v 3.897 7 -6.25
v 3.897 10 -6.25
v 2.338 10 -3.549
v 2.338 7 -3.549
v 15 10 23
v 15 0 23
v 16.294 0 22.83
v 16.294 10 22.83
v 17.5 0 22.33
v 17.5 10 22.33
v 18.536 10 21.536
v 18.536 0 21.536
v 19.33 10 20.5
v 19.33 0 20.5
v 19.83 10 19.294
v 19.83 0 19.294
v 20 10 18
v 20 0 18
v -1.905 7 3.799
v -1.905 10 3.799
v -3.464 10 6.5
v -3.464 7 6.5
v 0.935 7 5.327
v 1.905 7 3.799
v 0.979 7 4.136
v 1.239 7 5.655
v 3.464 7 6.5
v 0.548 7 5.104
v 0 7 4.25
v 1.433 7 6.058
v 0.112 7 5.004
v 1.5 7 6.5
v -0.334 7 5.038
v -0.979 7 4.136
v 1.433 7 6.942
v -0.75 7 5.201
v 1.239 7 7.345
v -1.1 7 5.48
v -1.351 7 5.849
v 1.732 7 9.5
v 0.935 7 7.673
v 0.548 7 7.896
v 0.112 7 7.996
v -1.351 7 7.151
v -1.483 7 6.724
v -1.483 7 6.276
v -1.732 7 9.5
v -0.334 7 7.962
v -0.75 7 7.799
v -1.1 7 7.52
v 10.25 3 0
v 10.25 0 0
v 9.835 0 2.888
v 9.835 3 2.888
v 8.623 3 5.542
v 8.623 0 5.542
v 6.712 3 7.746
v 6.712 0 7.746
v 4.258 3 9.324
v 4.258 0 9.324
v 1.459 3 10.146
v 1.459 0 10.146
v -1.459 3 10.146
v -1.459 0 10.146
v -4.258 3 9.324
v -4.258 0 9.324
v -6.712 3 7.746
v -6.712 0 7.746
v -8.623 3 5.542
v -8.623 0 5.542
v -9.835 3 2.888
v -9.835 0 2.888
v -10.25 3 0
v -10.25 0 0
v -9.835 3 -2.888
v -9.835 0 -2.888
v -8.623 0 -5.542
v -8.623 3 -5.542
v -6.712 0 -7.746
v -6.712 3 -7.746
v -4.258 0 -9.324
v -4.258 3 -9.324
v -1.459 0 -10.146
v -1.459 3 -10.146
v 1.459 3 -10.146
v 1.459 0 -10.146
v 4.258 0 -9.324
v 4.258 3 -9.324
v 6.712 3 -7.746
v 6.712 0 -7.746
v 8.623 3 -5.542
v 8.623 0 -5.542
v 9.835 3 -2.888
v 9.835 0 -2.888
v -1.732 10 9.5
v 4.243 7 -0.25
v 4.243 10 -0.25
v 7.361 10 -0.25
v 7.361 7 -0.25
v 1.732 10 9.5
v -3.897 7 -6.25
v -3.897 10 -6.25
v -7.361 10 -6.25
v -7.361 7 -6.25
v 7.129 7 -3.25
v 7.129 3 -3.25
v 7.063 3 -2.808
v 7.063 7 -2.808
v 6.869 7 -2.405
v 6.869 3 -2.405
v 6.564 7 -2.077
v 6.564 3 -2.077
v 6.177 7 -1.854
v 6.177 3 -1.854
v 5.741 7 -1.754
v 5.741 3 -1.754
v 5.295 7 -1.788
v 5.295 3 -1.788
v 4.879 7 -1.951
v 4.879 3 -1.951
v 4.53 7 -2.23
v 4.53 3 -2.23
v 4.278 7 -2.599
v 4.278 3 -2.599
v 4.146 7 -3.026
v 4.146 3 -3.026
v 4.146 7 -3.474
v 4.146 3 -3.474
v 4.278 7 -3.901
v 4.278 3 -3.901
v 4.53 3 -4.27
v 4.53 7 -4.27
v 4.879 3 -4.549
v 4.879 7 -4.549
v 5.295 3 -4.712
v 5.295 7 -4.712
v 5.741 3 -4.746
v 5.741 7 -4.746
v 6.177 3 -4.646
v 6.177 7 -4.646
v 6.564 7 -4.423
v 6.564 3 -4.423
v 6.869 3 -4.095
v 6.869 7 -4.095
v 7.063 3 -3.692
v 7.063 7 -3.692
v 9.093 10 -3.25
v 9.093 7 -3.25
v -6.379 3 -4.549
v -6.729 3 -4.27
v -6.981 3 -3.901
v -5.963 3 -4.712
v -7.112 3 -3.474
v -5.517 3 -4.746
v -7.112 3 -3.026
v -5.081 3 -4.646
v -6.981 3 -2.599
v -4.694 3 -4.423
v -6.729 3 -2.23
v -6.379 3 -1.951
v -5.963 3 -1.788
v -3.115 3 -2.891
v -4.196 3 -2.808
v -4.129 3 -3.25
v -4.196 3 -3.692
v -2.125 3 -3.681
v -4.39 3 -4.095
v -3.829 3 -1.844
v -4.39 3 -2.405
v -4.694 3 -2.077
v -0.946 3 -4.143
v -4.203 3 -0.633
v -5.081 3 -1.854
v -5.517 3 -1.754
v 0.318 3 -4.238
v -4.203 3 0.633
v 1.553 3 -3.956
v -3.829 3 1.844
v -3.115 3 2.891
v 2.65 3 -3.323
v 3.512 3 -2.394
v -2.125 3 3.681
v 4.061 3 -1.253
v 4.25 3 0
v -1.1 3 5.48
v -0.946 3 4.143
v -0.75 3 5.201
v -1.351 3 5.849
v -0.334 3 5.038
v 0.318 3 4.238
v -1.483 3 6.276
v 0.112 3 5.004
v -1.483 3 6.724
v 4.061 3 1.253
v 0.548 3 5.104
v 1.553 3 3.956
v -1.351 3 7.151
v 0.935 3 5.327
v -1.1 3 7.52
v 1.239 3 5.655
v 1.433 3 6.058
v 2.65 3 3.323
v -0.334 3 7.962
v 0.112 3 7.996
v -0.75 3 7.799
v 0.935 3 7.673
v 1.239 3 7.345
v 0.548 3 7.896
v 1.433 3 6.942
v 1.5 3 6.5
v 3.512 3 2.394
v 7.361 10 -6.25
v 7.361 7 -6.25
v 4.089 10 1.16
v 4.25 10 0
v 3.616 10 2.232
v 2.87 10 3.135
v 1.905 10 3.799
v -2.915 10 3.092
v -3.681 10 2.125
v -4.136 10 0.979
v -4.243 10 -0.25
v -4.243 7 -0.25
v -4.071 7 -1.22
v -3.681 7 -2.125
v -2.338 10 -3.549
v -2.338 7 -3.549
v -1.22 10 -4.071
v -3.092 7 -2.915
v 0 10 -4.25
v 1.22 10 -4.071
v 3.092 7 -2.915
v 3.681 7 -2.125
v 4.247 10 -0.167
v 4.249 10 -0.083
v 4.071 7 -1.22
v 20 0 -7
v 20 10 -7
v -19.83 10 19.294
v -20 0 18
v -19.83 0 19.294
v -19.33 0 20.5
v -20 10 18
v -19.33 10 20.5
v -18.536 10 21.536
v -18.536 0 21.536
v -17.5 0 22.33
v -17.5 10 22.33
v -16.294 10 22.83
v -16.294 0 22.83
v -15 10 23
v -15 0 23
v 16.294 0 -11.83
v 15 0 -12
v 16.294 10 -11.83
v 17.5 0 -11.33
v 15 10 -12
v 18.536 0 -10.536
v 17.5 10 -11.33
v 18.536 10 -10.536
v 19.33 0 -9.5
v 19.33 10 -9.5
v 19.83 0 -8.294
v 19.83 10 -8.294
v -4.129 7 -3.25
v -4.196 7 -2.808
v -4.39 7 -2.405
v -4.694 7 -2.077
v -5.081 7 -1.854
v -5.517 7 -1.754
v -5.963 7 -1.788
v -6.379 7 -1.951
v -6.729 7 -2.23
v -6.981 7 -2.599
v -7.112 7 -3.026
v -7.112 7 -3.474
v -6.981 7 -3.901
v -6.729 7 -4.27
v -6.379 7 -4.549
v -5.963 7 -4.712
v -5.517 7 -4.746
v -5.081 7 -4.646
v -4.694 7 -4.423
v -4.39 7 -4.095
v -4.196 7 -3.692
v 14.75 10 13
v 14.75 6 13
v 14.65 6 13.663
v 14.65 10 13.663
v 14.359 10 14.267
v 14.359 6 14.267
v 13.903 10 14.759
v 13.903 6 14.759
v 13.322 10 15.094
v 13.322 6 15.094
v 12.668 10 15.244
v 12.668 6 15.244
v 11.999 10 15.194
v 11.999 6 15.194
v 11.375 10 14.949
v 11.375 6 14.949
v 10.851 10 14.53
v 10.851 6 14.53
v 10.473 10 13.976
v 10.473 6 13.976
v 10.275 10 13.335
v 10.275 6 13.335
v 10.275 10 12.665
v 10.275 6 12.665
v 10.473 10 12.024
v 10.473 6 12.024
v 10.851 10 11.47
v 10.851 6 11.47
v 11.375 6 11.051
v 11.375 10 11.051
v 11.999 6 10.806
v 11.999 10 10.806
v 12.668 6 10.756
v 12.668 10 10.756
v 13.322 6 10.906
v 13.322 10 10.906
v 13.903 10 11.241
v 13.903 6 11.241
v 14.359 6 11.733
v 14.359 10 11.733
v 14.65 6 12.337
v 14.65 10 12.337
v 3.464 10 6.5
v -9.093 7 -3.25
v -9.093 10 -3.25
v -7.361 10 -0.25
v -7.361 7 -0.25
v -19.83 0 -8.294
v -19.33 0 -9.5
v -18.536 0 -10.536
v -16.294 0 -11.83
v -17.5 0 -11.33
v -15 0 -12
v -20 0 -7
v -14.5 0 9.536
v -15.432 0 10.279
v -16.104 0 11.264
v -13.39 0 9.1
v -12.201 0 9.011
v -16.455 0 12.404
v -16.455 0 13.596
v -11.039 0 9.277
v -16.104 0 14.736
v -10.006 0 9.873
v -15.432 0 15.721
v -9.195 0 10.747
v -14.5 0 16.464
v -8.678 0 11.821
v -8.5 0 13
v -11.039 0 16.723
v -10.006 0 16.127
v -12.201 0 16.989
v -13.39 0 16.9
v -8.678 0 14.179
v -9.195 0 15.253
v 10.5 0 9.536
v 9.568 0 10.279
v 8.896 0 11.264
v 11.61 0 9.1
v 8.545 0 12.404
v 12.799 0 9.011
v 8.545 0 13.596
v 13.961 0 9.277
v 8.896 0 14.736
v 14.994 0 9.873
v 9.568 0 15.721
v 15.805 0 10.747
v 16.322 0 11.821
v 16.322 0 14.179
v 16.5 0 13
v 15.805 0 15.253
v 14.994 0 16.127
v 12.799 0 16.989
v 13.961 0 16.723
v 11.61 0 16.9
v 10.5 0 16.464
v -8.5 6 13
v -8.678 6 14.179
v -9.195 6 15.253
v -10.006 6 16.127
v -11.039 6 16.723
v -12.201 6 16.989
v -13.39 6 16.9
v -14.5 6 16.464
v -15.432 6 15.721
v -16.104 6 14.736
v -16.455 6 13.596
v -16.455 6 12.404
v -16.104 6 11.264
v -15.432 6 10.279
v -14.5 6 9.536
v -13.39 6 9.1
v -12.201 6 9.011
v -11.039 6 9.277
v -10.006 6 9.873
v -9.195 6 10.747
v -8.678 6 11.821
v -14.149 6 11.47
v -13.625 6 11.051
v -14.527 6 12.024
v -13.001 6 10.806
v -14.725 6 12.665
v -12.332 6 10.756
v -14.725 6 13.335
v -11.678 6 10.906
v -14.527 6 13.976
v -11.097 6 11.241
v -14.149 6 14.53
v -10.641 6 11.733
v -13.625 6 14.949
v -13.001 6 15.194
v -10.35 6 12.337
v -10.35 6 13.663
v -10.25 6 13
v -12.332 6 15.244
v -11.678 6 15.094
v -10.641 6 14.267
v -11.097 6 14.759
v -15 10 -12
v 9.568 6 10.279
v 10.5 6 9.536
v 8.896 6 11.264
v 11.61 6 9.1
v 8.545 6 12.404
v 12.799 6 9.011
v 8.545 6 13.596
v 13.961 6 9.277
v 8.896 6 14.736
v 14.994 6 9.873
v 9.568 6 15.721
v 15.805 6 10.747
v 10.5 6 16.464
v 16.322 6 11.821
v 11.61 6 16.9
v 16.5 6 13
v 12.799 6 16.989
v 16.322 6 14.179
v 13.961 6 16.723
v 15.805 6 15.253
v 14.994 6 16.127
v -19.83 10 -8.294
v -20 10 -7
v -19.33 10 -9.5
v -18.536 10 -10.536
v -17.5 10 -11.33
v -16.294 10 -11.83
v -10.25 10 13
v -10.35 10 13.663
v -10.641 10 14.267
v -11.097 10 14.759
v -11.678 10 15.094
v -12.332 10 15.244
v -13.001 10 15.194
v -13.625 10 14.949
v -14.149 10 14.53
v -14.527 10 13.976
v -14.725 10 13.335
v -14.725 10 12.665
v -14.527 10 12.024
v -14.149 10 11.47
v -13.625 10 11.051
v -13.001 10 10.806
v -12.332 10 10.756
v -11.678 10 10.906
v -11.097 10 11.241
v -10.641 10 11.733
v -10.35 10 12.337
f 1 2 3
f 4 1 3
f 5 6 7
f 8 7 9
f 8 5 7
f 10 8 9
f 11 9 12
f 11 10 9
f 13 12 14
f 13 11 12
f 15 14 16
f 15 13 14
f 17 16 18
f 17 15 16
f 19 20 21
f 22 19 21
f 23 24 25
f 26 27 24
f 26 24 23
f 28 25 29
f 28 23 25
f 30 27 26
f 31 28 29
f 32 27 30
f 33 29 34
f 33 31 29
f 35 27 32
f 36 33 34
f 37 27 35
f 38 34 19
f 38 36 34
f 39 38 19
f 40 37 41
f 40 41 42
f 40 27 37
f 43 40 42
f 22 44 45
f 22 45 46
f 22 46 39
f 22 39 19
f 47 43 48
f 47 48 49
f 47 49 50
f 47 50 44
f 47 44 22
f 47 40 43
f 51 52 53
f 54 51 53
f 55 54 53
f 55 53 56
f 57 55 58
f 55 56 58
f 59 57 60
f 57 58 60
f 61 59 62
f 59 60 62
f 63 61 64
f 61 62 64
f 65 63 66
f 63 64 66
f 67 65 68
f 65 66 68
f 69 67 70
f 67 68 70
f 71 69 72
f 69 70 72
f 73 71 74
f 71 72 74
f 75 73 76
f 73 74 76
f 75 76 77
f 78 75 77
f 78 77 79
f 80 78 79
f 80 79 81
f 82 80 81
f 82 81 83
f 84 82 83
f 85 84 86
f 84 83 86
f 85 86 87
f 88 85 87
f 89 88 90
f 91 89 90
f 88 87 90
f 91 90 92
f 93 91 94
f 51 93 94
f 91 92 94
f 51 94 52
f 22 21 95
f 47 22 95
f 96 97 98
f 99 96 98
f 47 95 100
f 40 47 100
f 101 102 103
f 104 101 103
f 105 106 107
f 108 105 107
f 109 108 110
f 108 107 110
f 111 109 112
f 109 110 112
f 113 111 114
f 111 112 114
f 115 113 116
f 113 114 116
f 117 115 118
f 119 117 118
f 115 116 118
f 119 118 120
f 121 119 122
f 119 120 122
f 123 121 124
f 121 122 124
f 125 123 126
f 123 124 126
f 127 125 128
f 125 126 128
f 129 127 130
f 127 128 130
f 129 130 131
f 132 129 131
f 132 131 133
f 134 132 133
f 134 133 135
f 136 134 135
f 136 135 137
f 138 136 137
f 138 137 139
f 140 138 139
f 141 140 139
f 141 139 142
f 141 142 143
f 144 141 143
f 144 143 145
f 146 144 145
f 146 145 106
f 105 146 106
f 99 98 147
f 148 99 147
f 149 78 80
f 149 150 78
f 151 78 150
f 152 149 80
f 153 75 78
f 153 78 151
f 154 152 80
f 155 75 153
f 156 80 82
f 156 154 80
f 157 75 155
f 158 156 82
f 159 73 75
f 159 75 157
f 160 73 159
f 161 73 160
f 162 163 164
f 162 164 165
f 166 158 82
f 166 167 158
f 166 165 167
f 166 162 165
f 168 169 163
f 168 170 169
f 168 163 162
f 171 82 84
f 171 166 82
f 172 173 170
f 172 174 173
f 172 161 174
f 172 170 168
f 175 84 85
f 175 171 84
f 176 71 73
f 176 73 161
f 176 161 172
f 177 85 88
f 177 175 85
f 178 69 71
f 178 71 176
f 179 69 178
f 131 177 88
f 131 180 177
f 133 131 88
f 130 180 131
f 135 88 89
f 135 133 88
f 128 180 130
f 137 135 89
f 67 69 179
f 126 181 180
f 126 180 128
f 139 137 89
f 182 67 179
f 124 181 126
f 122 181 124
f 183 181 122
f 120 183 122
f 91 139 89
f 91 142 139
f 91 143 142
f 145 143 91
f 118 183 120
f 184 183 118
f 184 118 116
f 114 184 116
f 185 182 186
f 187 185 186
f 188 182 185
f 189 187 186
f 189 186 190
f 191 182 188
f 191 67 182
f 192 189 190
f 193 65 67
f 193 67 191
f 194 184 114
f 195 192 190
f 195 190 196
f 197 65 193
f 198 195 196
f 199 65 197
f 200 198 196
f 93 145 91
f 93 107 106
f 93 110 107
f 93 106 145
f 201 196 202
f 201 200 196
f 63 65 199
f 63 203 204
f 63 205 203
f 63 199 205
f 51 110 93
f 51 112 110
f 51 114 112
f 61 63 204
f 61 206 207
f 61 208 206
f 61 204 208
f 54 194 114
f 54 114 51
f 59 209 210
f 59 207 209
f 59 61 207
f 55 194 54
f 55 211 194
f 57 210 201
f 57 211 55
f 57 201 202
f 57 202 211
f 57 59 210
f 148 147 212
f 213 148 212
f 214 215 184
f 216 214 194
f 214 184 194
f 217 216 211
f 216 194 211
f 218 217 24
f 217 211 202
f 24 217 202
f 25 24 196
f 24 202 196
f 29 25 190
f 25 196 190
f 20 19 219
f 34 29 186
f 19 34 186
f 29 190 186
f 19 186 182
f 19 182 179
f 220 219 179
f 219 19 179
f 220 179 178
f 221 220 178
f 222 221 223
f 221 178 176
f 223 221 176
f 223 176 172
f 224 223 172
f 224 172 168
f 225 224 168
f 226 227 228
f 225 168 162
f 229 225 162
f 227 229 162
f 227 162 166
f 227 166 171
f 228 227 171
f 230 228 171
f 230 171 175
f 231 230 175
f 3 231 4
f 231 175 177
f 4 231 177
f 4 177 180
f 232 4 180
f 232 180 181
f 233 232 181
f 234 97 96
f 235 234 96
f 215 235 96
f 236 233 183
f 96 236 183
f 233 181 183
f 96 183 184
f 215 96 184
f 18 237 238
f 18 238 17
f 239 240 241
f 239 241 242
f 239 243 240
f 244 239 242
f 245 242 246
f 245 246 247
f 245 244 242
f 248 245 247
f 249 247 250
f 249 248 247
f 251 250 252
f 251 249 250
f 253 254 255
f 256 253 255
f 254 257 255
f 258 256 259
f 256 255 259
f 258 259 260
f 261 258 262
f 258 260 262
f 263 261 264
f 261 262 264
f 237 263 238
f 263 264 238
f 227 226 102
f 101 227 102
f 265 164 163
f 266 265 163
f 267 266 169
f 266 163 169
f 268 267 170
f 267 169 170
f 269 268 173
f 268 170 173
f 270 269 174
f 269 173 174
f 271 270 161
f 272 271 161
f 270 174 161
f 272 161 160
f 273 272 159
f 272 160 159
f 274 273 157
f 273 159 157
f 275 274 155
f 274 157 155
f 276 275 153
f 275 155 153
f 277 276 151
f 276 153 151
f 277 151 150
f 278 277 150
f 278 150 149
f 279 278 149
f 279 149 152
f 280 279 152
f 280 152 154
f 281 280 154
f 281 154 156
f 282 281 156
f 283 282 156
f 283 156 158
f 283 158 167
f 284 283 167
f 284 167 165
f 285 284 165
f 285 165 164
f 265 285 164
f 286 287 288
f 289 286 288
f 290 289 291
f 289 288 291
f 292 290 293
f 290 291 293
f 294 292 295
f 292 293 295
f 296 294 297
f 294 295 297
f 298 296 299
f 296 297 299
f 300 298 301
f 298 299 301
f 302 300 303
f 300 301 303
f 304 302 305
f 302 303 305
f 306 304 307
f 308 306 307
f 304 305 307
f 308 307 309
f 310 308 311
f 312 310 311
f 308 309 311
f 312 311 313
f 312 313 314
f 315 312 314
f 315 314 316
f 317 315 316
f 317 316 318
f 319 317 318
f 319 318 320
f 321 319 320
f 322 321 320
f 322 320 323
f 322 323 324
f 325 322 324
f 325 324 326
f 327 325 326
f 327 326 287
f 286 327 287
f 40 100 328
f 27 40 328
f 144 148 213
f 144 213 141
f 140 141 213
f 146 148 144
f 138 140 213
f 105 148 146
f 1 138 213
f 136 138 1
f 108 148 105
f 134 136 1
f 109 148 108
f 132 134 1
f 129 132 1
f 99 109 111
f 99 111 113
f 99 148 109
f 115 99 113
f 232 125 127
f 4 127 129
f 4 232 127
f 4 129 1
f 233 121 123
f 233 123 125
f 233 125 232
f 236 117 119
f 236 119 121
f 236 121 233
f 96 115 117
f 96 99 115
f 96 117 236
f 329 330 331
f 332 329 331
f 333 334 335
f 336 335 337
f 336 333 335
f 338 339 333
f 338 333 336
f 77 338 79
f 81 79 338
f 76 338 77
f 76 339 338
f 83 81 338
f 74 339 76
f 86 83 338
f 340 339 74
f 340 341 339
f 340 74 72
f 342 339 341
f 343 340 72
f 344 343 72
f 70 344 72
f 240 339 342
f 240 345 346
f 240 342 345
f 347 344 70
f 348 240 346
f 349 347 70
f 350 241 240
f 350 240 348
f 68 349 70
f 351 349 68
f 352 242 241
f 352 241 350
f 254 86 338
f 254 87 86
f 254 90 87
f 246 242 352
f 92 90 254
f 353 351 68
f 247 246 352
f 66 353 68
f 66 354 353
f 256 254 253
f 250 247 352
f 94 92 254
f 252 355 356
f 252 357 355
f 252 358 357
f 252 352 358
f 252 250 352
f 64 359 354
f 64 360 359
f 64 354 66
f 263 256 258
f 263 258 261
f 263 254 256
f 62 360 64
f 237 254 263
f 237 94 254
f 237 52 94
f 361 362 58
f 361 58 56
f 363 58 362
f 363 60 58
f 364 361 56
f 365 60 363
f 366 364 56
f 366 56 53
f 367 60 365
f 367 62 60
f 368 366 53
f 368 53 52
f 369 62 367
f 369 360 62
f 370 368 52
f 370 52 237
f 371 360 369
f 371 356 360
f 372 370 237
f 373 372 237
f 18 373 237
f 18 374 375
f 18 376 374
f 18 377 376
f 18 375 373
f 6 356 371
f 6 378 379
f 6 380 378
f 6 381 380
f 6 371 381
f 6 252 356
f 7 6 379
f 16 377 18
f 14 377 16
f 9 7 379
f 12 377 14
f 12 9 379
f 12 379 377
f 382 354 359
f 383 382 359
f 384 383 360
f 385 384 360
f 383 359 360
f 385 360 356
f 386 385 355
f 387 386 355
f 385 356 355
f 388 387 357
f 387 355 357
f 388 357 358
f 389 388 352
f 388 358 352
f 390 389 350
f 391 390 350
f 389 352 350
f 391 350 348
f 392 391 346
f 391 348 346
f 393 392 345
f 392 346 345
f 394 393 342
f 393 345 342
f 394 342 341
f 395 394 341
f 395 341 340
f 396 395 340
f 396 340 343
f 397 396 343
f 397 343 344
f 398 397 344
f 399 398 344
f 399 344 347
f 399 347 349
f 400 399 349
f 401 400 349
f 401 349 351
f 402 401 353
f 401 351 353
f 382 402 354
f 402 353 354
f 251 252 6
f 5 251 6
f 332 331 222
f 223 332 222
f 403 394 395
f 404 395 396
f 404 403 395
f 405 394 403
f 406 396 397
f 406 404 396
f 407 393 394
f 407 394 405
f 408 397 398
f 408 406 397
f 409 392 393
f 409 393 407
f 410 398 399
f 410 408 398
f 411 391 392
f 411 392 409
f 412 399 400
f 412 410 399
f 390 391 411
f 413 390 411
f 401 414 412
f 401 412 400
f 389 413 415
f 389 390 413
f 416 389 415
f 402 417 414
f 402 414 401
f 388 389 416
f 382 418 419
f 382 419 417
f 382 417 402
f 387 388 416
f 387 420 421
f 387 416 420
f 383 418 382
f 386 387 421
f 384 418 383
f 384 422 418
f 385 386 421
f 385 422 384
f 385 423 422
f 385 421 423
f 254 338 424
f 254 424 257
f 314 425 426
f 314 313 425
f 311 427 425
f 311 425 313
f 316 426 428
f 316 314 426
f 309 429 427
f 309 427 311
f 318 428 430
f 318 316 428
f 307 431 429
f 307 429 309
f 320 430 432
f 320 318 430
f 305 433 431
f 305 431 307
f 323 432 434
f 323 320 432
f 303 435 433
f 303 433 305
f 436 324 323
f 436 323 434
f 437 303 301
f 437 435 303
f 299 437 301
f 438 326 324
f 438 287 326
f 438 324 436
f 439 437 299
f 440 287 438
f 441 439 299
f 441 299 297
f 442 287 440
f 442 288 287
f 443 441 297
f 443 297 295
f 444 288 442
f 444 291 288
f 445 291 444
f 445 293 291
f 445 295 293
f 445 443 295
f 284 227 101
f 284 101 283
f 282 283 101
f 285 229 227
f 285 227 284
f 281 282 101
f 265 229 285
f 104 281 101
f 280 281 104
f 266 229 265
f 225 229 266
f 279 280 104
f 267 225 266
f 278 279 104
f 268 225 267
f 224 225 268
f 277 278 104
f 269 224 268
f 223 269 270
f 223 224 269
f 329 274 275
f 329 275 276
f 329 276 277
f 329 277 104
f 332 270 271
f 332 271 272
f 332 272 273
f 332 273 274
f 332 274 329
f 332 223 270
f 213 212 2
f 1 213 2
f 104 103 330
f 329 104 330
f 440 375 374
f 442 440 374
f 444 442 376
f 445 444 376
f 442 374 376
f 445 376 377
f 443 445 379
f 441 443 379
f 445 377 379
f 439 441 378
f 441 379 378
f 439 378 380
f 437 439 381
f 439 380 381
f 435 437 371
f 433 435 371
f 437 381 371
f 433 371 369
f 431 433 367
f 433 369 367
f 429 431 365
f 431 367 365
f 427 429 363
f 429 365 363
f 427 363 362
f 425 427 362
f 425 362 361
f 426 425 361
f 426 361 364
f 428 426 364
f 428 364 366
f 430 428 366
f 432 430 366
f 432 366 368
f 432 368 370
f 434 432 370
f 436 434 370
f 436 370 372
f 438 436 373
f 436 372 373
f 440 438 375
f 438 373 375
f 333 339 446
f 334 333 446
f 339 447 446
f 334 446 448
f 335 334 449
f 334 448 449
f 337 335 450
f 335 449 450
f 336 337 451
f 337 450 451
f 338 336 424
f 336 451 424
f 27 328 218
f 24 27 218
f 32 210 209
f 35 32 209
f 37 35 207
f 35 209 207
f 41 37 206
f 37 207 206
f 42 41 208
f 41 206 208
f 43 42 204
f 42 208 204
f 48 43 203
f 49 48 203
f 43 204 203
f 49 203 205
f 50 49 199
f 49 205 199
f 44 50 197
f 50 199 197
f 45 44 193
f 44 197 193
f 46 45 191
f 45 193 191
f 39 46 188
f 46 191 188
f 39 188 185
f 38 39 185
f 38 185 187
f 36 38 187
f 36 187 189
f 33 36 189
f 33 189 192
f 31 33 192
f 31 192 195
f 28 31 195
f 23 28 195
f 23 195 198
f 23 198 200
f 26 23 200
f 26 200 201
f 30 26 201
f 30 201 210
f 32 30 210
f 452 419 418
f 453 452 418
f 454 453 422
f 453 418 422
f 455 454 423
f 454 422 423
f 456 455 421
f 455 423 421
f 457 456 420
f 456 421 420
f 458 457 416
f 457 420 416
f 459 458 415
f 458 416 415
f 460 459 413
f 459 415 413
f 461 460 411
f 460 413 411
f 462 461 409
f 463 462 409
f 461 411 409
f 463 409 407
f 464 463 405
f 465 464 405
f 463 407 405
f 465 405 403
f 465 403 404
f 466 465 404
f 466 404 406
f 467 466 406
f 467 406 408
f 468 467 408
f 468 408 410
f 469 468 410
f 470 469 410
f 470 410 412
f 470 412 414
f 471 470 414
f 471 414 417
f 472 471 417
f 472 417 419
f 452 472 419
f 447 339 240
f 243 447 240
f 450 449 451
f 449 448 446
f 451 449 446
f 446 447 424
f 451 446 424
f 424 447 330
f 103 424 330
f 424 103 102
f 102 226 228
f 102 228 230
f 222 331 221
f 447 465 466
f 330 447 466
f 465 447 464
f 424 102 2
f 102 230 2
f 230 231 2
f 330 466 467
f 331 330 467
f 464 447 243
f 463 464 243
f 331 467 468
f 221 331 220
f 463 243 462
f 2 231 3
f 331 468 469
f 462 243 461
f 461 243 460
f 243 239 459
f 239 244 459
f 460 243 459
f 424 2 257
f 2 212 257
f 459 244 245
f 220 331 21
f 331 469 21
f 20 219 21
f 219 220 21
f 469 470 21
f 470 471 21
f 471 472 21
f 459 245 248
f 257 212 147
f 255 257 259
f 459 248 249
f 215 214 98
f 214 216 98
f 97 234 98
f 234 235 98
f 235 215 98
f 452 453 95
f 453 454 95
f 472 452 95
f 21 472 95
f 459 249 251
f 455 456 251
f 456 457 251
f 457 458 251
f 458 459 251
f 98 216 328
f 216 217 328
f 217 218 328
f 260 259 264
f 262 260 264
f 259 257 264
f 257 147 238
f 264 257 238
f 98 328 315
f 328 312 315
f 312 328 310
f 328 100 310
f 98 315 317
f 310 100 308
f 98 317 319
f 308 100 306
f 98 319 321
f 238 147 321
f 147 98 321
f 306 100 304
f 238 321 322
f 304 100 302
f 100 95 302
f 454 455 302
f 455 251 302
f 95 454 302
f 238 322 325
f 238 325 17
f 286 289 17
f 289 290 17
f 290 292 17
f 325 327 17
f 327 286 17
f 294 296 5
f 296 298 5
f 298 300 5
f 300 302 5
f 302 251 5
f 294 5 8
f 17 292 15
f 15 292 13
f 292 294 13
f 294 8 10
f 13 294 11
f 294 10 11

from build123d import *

# Parameters (mm, degrees)
F0_W     = 40
F0_H     = 35
F0_R     = 10.25
F0_R_2   = 4
F0_R_3   = 2.25
F0_R_4   = 1.5
F0_R_5   = 4.25
F1_DEPTH = 10
F2_DEPTH = 6
F3_DEPTH = 3
F5_DEPTH = 3
F6_R     = 5


with BuildPart() as f1:
    # F0 (on Front) → F1 (new body)
    with BuildSketch(Plane.XZ):
        with Locations((0, 5.5)):
            Rectangle(F0_W, F0_H)
        Circle(F0_R, mode=Mode.SUBTRACT)
        with Locations((-12.5, 13)):
            Circle(F0_R_2, mode=Mode.SUBTRACT)
        with Locations((12.5, 13)):
            Circle(F0_R_2, mode=Mode.SUBTRACT)
        with Locations((-12.5, 13)):
            Circle(F0_R_2)
        with Locations((-12.5, 13)):
            Circle(F0_R_3, mode=Mode.SUBTRACT)
        with Locations((12.5, 13)):
            Circle(F0_R_2)
        with Locations((12.5, 13)):
            Circle(F0_R_3, mode=Mode.SUBTRACT)
        Circle(F0_R)
        with Locations((-5.629165, -3.25)):
            Circle(F0_R_4, mode=Mode.SUBTRACT)
        Circle(F0_R_5, mode=Mode.SUBTRACT)
        with Locations((5.629165, -3.25)):
            Circle(F0_R_4, mode=Mode.SUBTRACT)
        with Locations((0, 6.5)):
            Circle(F0_R_4, mode=Mode.SUBTRACT)
    extrude(amount=-F1_DEPTH)

    # F0 (on Front) → F2 (cut)
    with BuildSketch(Plane.XZ):
        with Locations((12.5, 13)):
            Circle(F0_R_2)
        with Locations((12.5, 13)):
            Circle(F0_R_3, mode=Mode.SUBTRACT)
        with Locations((-12.5, 13)):
            Circle(F0_R_2)
        with Locations((-12.5, 13)):
            Circle(F0_R_3, mode=Mode.SUBTRACT)
    extrude(amount=-F2_DEPTH, mode=Mode.SUBTRACT)

    # F0 (on Front) → F3 (cut)
    with BuildSketch(Plane.XZ):
        Circle(F0_R)
        with Locations((-5.629165, -3.25)):
            Circle(F0_R_4, mode=Mode.SUBTRACT)
        Circle(F0_R_5, mode=Mode.SUBTRACT)
        with Locations((5.629165, -3.25)):
            Circle(F0_R_4, mode=Mode.SUBTRACT)
        with Locations((0, 6.5)):
            Circle(F0_R_4, mode=Mode.SUBTRACT)
    extrude(amount=-F3_DEPTH, mode=Mode.SUBTRACT)

    # F4 (on face) → F5 (cut)
    with BuildSketch(Plane(origin=(0, 10, 0), x_dir=(-1, 0, 0), z_dir=(0, 1, 0))):
        with BuildLine():
            Line((1.732051, 9.5), (-1.732051, 9.5))
            Line((-1.732051, 9.5), (-3.464102, 6.5))
            Line((-3.464102, 6.5), (-1.732051, 3.5))
            Line((-1.732051, 3.5), (-2.165064, 2.75))
            ThreePointArc((-2.165064, 2.75), (0, 3.5), (2.165064, 2.75))
            Line((2.165064, 2.75), (1.732051, 3.5))
            Line((1.732051, 3.5), (3.464102, 6.5))
            Line((3.464102, 6.5), (1.732051, 9.5))
        make_face()
        with BuildLine():
            Line((-3.464102, 0.5), (-2.165064, 2.75))
            ThreePointArc((-2.165064, 2.75), (-3.031089, 1.75), (-3.464102, 0.5))
        make_face()
        with BuildLine():
            ThreePointArc((3.464102, 0.5), (3.031089, 1.75), (2.165064, 2.75))
            Line((2.165064, 2.75), (3.464102, 0.5))
        make_face()
        with BuildLine():
            ThreePointArc((-1.299038, -3.25), (-3.031089, -1.75), (-3.464102, 0.5))
            Line((-3.464102, 0.5), (-3.897114, -0.25))
            Line((-3.897114, -0.25), (-7.361216, -0.25))
            Line((-7.361216, -0.25), (-9.093267, -3.25))
            Line((-9.093267, -3.25), (-7.361216, -6.25))
            Line((-7.361216, -6.25), (-3.897114, -6.25))
            Line((-3.897114, -6.25), (-2.165064, -3.25))
            Line((-2.165064, -3.25), (-1.299038, -3.25))
        make_face()
        with BuildLine():
            Line((3.897114, -0.25), (3.464102, 0.5))
            ThreePointArc((3.464102, 0.5), (3.491014, 0.250644), (3.5, 0))
            ThreePointArc((3.5, 0), (2.897985, -1.962571), (1.299038, -3.25))
            Line((1.299038, -3.25), (2.165064, -3.25))
            Line((2.165064, -3.25), (3.897114, -6.25))
            Line((3.897114, -6.25), (7.361216, -6.25))
            Line((7.361216, -6.25), (9.093267, -3.25))
            Line((9.093267, -3.25), (7.361216, -0.25))
            Line((7.361216, -0.25), (3.897114, -0.25))
        make_face()
        with BuildLine():
            Line((1.299038, -3.25), (-1.299038, -3.25))
            ThreePointArc((-1.299038, -3.25), (0, -3.5), (1.299038, -3.25))
        make_face()
    extrude(amount=-F5_DEPTH, mode=Mode.SUBTRACT)

    # F6
    f6_edges = [f1.edges().sort_by_distance(p)[0] for p in [
        (-20, 5, 23),
        (20, 5, 23),
        (20, 5, -12),
        (-20, 5, -12),
    ]]
    fillet(f6_edges, radius=F6_R)


solid = f1.part
